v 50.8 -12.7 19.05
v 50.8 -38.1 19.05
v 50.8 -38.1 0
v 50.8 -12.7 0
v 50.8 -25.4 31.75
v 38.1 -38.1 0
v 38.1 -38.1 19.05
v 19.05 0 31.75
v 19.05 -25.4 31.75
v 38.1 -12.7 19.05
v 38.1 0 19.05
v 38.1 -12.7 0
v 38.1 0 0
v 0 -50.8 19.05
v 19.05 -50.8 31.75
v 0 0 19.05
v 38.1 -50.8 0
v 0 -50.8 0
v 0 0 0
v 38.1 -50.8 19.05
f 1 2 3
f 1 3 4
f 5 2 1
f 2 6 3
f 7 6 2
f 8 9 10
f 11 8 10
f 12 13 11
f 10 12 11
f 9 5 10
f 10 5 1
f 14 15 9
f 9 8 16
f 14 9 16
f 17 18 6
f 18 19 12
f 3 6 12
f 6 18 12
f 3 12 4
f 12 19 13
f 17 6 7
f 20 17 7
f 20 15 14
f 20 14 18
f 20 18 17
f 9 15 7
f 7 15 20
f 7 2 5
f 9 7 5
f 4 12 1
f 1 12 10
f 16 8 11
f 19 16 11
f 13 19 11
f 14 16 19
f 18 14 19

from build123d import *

# Parameters (mm, degrees)
F1_DEPTH = 50.8
F2_W     = 25.4
F2_H     = 31.75
F3_DEPTH = 12.7
F5_DEPTH = 50.8
F7_DEPTH = 12.7
F8_DEPTH = 31.75


with BuildPart() as f1:
    # F0 (on Front) → F1 (new body)
    with BuildSketch(Plane.XZ):
        Polygon((0, 19.05), (0, 0), (38.1, 0), (38.1, 19.05), (38.1, 31.75), (19.05, 31.75), align=None)
    extrude(amount=F1_DEPTH)

    # F2 (on face) → F3 (join)
    with BuildSketch(Plane.YZ.offset(38.1)):
        with Locations((-25.4, 15.875)):
            Rectangle(F2_W, F2_H)
    extrude(amount=F3_DEPTH)

    # F4 (on face) → F5 (cut)
    with BuildSketch(Plane.XZ.offset(50.8)):
        Polygon((38.1, 31.75), (19.05, 31.75), (38.1, 19.05), align=None)
    extrude(amount=-F5_DEPTH, mode=Mode.SUBTRACT)

    # F6 (on face) → F7 (cut)
    with BuildSketch(Plane.YZ.offset(50.8)):
        Polygon((-38.1, 31.75), (-38.1, 19.05), (-25.4, 31.75), align=None)
        Polygon((-12.7, 31.75), (-25.4, 31.75), (-12.7, 19.05), align=None)
    extrude(amount=-F7_DEPTH, mode=Mode.SUBTRACT)

    # F8 (add): a face of the model
    f8_faces = [f1.faces().sort_by_distance(p)[0] for p in [
        (50.8, -25.4, 12.9645833333),
    ]]
    extrude(f8_faces, amount=-F8_DEPTH)


solid = f1.part
